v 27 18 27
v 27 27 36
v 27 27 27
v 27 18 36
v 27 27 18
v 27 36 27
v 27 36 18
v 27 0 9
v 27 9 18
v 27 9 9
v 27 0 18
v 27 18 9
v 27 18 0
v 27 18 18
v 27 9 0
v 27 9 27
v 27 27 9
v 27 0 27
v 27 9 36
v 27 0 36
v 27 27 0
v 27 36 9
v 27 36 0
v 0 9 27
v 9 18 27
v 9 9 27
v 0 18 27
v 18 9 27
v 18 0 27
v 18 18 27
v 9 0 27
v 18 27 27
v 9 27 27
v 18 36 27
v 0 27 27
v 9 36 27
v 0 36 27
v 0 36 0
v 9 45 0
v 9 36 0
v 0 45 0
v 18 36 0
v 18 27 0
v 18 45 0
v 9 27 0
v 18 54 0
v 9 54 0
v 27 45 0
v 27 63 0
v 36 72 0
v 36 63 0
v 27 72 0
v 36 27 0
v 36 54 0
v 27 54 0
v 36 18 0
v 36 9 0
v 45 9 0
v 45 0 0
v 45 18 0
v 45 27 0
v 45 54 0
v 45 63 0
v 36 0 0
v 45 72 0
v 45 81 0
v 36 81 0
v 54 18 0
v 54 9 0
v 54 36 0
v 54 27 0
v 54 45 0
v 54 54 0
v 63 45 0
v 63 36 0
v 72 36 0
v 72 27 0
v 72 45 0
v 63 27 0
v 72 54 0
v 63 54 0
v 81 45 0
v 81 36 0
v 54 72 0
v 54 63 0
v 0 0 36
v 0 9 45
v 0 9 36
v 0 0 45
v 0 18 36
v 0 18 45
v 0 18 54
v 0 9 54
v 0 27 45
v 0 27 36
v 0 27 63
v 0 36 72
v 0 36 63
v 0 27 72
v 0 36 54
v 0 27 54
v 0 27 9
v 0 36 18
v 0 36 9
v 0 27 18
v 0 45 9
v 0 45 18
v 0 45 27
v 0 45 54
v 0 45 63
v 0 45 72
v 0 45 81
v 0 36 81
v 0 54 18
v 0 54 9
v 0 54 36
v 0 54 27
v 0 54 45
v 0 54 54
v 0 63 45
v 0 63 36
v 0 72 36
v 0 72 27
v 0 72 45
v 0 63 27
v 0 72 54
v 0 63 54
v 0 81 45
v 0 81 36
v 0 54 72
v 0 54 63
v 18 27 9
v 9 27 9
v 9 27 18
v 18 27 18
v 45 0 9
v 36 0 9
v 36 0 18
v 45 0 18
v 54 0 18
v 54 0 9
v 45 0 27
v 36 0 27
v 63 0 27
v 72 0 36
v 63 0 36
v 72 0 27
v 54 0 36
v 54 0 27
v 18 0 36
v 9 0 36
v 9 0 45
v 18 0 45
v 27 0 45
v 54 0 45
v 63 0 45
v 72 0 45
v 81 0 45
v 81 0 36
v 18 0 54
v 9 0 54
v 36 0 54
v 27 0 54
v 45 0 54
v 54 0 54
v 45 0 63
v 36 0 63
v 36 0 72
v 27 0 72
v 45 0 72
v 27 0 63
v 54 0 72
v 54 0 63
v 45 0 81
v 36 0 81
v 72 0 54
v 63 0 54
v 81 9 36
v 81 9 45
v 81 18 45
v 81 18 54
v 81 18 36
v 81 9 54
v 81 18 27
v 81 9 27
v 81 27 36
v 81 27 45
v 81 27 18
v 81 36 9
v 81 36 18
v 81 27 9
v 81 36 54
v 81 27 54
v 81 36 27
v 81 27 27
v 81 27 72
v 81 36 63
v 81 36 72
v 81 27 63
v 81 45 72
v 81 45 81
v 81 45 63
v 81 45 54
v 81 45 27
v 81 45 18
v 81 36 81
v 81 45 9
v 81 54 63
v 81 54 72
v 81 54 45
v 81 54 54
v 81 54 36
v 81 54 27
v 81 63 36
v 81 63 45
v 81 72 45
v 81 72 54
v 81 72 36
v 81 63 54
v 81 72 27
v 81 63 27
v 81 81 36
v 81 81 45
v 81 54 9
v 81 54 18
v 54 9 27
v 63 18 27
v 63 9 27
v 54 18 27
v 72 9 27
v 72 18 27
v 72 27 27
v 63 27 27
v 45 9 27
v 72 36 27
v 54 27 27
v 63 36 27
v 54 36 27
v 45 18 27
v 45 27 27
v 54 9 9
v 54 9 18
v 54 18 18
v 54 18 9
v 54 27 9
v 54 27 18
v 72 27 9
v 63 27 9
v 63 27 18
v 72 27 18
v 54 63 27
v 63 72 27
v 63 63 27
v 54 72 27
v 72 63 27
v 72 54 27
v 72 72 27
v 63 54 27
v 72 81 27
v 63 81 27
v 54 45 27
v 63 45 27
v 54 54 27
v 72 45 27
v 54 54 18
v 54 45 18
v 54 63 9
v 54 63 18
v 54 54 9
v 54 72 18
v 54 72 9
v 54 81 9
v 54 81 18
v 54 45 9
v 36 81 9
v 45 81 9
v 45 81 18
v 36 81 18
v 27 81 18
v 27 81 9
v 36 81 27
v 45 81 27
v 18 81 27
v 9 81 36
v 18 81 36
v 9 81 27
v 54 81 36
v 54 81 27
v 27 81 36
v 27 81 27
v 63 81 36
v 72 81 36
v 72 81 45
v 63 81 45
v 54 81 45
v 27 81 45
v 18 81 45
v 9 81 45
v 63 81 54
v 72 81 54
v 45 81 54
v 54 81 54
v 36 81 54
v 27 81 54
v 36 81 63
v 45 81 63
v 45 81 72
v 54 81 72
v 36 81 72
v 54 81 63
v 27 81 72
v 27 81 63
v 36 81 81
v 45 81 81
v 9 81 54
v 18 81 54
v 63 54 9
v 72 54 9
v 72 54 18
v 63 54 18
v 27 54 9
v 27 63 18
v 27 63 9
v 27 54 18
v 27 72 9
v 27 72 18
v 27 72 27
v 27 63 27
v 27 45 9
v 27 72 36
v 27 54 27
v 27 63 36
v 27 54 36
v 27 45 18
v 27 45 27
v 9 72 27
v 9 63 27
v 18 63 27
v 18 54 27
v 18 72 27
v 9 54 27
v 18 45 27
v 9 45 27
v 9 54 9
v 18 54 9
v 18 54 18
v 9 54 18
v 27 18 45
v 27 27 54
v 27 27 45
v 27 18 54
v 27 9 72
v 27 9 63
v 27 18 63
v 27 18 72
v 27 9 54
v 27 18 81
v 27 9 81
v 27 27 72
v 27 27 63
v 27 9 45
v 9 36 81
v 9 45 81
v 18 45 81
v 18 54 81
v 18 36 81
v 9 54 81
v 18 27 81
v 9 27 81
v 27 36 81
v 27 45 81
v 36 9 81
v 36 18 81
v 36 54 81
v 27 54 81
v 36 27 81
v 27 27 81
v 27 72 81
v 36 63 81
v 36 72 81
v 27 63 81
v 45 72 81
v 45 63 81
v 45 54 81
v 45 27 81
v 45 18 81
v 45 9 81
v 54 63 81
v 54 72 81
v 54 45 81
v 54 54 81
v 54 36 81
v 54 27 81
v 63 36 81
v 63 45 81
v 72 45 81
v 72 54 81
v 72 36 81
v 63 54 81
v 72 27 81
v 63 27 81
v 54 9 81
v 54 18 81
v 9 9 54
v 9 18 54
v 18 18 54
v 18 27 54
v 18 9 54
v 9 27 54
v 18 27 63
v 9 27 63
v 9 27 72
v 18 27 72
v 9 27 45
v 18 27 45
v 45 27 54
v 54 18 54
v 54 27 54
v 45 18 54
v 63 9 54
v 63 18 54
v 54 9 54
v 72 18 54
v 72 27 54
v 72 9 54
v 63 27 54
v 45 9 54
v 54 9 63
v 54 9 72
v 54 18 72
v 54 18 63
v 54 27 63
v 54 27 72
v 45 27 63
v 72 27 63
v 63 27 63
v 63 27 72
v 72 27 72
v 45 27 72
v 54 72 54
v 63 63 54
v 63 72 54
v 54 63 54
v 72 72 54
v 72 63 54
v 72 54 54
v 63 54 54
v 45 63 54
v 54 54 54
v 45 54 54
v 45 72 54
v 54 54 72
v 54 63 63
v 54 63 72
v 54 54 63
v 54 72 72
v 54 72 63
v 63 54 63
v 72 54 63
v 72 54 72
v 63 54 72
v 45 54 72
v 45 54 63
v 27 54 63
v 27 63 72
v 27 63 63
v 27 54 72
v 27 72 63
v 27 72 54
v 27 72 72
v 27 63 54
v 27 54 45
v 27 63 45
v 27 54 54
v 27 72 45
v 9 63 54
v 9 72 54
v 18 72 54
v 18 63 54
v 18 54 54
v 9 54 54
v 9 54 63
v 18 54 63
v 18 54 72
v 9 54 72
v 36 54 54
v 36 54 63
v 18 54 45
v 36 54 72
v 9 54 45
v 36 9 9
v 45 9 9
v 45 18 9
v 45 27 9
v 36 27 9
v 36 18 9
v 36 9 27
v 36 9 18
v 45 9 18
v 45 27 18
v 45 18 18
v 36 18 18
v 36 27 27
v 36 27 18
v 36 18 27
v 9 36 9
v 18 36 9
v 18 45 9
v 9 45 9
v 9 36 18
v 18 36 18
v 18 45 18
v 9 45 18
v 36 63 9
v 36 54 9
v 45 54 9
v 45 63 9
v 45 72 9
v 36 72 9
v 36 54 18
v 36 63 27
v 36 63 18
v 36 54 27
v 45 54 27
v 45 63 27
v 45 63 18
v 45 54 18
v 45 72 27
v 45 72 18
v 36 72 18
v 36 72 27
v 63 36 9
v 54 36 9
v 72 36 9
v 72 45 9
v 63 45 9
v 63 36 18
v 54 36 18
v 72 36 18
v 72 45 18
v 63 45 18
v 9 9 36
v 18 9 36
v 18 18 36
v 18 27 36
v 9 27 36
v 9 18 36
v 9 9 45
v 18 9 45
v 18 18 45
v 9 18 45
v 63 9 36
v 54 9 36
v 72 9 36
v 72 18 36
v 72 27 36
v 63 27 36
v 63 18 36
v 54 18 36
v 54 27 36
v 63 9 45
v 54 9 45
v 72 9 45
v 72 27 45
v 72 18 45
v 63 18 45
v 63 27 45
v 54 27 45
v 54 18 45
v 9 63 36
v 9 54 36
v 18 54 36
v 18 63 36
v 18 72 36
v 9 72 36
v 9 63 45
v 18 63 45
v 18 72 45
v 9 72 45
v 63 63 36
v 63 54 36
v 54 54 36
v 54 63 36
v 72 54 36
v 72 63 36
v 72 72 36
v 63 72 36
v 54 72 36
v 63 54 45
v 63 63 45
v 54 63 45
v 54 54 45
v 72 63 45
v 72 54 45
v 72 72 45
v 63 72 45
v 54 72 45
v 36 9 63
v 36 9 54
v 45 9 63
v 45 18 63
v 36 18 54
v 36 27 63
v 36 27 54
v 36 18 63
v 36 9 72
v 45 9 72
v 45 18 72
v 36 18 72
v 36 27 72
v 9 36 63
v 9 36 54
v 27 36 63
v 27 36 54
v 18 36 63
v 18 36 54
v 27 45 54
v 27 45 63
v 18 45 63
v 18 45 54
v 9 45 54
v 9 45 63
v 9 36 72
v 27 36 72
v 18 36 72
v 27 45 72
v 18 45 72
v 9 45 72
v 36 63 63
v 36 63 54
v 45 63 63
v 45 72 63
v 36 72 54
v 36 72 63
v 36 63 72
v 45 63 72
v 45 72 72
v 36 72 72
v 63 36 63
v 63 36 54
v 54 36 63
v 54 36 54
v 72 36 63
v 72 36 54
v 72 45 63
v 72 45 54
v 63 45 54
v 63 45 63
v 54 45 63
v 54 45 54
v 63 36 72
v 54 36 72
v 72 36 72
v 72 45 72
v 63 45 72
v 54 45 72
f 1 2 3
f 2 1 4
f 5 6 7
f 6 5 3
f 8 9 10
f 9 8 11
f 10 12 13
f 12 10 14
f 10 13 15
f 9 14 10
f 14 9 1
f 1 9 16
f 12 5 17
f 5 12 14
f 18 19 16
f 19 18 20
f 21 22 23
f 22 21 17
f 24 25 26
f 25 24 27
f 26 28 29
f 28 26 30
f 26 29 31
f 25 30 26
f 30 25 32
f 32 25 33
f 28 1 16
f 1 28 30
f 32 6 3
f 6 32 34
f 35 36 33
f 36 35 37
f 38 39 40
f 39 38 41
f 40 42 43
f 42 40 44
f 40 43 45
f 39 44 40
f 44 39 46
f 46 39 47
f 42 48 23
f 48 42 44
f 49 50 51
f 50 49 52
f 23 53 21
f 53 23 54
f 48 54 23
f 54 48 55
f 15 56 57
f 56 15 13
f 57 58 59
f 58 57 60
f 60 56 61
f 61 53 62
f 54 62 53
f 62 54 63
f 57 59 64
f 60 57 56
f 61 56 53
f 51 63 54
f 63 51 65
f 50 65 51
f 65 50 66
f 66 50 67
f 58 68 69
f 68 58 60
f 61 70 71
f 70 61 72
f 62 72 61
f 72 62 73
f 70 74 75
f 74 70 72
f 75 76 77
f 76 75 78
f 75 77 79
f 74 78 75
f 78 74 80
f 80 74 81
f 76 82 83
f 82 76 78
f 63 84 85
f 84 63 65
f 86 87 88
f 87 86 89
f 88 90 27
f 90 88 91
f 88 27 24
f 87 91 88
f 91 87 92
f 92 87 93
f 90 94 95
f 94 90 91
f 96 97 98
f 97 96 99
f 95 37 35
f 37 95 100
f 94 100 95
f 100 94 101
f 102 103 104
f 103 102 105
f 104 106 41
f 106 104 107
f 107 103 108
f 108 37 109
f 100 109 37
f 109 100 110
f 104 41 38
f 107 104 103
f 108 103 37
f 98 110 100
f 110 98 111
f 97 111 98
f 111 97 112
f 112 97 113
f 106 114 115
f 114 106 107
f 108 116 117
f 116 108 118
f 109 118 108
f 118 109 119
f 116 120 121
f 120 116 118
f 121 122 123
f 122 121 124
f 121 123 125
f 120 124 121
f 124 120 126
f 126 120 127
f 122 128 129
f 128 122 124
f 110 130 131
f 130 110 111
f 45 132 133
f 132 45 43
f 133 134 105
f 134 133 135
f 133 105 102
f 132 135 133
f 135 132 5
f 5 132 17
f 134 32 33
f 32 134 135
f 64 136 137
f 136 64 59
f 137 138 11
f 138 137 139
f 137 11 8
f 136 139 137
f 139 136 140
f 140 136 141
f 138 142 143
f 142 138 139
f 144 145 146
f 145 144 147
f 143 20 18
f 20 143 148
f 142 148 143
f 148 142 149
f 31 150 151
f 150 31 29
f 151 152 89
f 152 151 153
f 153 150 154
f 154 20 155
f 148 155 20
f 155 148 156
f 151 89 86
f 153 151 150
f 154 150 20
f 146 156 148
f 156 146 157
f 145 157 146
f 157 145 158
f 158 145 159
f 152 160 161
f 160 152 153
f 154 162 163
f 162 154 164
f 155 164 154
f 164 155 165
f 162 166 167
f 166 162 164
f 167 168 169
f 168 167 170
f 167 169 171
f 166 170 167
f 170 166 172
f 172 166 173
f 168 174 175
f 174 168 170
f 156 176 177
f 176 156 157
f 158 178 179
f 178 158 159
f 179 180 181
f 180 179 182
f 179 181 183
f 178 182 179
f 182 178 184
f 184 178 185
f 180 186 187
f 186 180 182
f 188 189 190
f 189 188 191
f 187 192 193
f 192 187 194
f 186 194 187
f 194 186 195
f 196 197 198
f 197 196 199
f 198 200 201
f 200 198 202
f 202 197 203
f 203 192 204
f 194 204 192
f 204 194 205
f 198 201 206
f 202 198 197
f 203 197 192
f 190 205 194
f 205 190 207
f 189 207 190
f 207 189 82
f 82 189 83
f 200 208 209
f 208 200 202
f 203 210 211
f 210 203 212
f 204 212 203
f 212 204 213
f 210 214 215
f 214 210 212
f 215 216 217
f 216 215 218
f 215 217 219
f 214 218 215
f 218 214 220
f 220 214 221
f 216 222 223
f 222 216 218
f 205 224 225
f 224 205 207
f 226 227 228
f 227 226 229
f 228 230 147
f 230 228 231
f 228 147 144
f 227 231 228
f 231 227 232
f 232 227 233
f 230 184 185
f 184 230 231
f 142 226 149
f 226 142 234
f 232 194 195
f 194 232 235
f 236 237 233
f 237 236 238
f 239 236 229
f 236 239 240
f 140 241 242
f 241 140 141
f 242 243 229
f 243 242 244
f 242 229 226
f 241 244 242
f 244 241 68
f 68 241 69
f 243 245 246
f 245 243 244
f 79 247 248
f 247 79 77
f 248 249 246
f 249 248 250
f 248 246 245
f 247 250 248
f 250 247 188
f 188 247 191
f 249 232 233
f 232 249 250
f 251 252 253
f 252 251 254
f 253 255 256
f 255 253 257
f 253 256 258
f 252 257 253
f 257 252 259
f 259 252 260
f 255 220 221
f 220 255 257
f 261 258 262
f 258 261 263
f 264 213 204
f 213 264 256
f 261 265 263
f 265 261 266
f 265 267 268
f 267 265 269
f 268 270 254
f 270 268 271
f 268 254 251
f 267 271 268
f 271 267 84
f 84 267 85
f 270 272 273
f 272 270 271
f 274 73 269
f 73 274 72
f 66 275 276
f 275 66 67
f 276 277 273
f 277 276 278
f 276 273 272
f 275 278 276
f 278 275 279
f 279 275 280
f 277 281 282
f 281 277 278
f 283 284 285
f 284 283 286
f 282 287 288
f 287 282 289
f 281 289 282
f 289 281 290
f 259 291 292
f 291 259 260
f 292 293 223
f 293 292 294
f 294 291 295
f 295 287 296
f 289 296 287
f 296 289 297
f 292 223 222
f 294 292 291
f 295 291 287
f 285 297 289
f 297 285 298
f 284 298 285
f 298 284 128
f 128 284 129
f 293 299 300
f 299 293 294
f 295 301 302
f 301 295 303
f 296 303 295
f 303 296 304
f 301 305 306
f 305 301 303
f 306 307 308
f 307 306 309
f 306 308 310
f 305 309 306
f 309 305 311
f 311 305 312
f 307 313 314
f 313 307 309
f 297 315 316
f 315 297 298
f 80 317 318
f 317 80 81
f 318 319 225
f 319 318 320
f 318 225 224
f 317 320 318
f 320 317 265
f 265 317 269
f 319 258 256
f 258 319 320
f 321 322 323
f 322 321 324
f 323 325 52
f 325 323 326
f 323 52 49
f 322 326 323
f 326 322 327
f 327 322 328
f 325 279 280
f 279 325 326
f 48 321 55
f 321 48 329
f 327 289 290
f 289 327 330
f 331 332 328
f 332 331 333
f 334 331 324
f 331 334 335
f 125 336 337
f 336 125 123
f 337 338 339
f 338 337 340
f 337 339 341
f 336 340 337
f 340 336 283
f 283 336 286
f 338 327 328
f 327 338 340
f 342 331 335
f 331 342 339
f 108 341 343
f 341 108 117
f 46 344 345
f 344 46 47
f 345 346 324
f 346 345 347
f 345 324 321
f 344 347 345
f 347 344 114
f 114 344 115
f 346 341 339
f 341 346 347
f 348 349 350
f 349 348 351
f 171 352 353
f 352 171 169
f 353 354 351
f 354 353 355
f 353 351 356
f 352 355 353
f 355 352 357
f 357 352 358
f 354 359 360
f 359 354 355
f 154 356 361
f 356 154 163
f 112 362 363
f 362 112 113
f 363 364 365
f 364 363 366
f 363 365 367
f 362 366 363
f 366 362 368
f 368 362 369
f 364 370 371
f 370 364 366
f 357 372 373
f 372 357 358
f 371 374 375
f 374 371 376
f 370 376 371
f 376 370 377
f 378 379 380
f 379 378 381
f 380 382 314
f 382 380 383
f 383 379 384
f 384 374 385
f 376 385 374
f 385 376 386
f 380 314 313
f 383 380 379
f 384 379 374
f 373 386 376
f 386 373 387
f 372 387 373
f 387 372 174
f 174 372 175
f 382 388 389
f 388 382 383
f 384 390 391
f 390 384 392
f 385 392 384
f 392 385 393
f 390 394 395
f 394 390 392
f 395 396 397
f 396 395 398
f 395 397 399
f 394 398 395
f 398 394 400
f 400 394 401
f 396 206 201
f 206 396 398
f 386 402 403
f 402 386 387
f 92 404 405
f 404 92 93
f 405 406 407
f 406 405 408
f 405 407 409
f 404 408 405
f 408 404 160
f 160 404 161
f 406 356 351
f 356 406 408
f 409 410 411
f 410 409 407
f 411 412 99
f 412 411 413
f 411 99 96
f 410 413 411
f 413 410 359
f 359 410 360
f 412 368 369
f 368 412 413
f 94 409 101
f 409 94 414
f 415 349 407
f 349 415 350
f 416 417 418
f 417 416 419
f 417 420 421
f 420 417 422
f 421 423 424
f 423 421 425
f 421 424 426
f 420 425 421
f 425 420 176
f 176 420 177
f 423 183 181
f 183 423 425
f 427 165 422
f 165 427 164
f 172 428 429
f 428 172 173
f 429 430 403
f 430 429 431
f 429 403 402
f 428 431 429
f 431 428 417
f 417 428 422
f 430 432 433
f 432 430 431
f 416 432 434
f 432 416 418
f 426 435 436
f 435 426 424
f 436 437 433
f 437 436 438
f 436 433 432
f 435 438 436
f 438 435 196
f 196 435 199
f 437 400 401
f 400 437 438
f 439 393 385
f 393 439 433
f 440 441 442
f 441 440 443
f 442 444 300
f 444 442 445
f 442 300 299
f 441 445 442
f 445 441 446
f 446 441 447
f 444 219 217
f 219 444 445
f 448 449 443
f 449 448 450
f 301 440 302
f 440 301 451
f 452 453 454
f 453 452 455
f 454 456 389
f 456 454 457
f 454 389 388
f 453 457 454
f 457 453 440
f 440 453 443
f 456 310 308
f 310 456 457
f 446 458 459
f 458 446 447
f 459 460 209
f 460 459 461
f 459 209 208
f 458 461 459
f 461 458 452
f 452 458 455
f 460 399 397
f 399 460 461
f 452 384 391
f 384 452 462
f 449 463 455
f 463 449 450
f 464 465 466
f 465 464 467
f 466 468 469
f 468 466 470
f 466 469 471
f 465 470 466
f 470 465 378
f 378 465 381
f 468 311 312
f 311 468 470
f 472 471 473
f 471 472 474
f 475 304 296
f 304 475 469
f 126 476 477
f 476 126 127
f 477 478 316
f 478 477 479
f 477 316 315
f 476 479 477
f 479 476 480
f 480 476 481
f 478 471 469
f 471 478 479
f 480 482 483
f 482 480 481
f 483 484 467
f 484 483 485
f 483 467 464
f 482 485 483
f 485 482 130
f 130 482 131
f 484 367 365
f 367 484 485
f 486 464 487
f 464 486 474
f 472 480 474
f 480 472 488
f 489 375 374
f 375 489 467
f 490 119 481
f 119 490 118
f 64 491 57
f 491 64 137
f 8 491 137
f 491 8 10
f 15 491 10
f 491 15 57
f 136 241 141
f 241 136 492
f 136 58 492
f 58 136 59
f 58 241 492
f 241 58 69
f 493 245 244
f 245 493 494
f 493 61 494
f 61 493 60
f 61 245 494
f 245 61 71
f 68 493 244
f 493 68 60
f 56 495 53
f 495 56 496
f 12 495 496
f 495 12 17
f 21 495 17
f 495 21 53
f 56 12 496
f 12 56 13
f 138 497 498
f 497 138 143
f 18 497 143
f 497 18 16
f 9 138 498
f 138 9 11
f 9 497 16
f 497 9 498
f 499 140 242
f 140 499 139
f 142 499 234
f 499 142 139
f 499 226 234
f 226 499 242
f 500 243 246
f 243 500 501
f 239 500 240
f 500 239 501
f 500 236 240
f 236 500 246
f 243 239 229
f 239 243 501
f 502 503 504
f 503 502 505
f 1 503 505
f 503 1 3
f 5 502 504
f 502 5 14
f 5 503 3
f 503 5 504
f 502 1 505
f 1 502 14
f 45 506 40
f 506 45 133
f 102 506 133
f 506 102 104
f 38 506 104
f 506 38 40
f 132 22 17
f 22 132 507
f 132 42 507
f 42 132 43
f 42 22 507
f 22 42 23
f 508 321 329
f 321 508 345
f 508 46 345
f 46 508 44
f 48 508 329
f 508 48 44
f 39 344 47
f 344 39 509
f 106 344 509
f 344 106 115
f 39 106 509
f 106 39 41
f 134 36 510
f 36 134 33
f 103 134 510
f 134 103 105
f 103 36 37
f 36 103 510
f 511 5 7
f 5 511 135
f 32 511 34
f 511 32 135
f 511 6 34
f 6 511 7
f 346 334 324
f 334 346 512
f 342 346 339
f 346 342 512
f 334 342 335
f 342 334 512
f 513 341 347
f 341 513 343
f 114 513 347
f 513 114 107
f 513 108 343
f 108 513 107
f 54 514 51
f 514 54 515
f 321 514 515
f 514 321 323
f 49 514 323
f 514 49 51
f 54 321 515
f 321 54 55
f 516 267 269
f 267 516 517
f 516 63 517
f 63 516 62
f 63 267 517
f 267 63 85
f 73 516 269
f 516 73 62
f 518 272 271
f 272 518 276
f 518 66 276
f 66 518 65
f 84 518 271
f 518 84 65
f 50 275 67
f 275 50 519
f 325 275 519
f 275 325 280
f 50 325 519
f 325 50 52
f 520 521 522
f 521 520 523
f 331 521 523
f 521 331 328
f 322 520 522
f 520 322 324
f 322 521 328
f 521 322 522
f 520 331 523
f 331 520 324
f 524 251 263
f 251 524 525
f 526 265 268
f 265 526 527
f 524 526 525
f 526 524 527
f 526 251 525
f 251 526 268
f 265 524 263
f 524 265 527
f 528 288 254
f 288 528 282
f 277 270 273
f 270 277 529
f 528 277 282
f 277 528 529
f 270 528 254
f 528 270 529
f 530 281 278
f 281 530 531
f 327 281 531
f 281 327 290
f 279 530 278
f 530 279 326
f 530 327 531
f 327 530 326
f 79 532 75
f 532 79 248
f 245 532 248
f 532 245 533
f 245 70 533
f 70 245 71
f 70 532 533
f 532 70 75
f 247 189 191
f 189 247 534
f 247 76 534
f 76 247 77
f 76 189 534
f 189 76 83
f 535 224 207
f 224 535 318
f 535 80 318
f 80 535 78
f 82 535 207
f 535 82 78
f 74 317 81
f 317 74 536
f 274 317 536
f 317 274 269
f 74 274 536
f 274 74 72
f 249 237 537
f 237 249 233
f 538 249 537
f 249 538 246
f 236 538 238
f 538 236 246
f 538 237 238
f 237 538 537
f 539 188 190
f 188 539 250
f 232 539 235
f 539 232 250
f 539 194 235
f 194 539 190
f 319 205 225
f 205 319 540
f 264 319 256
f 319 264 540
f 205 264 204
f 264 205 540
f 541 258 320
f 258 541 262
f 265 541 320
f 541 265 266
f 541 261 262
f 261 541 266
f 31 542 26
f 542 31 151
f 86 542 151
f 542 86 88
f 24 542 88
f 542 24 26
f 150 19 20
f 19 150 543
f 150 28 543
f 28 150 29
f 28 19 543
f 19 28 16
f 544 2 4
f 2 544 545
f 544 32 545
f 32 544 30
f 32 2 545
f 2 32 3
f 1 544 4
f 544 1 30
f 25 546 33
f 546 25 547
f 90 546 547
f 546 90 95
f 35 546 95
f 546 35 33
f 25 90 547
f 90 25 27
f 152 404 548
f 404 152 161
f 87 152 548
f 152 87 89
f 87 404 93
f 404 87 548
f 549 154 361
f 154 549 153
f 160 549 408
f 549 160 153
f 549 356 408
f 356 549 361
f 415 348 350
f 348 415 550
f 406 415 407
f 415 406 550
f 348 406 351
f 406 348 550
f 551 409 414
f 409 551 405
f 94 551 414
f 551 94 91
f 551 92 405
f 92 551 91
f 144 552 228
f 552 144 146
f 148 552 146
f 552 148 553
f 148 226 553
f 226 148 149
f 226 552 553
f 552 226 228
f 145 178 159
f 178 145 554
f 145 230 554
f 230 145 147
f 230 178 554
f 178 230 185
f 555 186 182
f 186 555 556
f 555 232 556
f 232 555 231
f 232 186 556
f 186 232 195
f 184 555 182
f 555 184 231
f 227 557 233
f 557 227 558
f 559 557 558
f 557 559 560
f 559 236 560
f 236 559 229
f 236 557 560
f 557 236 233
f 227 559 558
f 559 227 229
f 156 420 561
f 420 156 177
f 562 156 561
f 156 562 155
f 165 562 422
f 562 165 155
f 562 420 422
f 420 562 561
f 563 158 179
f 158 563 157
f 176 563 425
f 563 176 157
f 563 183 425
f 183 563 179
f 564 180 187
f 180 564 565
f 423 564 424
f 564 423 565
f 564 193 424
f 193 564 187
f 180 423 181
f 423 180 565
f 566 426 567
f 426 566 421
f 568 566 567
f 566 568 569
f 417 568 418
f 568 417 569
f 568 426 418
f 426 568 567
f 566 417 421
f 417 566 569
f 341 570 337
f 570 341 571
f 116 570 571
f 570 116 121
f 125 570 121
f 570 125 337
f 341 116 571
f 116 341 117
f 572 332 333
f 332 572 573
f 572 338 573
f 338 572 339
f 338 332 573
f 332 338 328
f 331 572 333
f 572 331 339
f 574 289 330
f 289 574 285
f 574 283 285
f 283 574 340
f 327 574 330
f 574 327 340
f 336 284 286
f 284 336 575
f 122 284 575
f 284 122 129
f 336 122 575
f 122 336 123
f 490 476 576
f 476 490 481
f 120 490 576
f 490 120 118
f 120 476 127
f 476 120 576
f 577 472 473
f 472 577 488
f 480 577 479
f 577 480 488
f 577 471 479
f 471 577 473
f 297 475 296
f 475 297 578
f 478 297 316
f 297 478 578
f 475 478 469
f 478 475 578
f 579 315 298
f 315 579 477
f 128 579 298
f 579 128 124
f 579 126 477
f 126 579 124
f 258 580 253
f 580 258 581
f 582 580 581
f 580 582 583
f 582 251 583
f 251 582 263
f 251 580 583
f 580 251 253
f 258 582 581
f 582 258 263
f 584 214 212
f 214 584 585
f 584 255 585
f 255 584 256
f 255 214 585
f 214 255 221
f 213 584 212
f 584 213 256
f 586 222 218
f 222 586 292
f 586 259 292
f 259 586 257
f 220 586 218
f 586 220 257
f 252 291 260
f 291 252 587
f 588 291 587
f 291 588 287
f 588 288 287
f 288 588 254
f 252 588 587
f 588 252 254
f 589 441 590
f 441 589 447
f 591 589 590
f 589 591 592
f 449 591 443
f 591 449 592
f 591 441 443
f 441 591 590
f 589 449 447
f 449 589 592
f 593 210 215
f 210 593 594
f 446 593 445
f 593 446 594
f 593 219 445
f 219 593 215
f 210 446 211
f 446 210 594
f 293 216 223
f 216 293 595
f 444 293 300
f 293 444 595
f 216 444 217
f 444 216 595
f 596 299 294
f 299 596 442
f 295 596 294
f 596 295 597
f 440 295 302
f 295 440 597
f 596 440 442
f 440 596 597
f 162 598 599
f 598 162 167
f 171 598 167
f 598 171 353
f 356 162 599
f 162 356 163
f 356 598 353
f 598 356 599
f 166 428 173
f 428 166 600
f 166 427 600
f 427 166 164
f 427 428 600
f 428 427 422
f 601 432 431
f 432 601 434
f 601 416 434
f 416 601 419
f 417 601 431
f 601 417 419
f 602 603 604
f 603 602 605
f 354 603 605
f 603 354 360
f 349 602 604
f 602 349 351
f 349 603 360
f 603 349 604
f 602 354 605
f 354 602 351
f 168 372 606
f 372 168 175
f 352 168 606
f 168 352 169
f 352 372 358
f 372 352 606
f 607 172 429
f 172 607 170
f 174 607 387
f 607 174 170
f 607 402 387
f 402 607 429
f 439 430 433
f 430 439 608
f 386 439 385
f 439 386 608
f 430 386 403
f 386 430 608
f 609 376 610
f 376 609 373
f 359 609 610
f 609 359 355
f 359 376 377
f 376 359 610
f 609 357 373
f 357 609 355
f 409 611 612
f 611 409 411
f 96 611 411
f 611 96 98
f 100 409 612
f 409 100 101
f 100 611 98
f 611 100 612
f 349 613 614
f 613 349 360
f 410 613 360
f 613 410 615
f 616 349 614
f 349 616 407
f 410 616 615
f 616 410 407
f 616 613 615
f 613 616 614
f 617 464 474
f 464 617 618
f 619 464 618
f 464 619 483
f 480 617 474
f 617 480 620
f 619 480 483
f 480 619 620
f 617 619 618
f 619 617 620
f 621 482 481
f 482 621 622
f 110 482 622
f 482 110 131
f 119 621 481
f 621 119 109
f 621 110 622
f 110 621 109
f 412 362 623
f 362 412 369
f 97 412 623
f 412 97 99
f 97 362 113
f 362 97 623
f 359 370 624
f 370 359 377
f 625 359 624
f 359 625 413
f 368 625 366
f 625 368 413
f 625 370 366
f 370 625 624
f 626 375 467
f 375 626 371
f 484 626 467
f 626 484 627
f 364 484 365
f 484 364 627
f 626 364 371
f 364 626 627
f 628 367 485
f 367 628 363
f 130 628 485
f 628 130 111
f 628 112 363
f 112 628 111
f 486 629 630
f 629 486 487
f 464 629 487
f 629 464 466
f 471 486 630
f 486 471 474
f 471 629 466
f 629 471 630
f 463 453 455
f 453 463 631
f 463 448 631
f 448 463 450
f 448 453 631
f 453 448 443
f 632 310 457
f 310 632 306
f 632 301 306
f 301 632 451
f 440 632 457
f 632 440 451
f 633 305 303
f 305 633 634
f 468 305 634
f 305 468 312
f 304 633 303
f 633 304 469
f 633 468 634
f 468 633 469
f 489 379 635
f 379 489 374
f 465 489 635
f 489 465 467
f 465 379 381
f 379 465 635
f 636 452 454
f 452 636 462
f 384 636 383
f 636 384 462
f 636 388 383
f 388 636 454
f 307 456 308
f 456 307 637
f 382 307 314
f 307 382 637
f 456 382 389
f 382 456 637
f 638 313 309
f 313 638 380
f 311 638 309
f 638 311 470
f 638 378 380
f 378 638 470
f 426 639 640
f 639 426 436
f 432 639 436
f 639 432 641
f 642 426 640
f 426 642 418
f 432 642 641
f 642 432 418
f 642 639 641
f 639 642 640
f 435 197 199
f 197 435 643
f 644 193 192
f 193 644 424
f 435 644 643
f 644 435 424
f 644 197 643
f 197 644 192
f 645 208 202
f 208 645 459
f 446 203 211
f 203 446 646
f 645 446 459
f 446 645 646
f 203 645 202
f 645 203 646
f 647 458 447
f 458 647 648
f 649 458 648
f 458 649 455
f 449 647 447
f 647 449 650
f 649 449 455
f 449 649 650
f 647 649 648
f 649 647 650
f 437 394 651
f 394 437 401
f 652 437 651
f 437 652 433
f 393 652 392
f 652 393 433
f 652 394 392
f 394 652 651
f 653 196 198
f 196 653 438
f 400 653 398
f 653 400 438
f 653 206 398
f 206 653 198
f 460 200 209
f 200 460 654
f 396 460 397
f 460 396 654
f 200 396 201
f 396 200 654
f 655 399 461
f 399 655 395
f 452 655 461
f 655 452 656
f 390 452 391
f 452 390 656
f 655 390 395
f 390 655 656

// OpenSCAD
difference () {
    cube (81);
    union (){
        cutcube (27,[0,0,0]);
        cutcube (9,[27,0,0]);
        cutcube (9,[0,27,0]);
        cutcube (9,[27,54,0]);
        cutcube (9,[54,27,0]);
    
        cutcube (9,[0,0,27]);
        cutcube (9,[54,0,27]);
        cutcube (9,[0,54,27]);
        cutcube (9,[54,54,27]);

        
        cutcube (9,[27,0,54]);
        cutcube (9,[0,27,54]);
        cutcube (9,[27,54,54]);
        cutcube (9,[54,27,54]);
   }
}

module cutcube (size, origin)
{
    shift = 2* size;
    
    translate(origin) cube(size);
    translate([shift,0,0]+origin) cube(size);
    translate([shift,shift,0]+origin) cube (size);
    translate([0,shift,0]+origin) cube(size);
    translate([0,0,shift]+origin) cube(size);
    translate([shift,0,shift]+origin) cube(size);
    translate([shift,shift,shift]+origin) cube (size);
    translate([0,shift,shift]+origin) cube(size);
}
